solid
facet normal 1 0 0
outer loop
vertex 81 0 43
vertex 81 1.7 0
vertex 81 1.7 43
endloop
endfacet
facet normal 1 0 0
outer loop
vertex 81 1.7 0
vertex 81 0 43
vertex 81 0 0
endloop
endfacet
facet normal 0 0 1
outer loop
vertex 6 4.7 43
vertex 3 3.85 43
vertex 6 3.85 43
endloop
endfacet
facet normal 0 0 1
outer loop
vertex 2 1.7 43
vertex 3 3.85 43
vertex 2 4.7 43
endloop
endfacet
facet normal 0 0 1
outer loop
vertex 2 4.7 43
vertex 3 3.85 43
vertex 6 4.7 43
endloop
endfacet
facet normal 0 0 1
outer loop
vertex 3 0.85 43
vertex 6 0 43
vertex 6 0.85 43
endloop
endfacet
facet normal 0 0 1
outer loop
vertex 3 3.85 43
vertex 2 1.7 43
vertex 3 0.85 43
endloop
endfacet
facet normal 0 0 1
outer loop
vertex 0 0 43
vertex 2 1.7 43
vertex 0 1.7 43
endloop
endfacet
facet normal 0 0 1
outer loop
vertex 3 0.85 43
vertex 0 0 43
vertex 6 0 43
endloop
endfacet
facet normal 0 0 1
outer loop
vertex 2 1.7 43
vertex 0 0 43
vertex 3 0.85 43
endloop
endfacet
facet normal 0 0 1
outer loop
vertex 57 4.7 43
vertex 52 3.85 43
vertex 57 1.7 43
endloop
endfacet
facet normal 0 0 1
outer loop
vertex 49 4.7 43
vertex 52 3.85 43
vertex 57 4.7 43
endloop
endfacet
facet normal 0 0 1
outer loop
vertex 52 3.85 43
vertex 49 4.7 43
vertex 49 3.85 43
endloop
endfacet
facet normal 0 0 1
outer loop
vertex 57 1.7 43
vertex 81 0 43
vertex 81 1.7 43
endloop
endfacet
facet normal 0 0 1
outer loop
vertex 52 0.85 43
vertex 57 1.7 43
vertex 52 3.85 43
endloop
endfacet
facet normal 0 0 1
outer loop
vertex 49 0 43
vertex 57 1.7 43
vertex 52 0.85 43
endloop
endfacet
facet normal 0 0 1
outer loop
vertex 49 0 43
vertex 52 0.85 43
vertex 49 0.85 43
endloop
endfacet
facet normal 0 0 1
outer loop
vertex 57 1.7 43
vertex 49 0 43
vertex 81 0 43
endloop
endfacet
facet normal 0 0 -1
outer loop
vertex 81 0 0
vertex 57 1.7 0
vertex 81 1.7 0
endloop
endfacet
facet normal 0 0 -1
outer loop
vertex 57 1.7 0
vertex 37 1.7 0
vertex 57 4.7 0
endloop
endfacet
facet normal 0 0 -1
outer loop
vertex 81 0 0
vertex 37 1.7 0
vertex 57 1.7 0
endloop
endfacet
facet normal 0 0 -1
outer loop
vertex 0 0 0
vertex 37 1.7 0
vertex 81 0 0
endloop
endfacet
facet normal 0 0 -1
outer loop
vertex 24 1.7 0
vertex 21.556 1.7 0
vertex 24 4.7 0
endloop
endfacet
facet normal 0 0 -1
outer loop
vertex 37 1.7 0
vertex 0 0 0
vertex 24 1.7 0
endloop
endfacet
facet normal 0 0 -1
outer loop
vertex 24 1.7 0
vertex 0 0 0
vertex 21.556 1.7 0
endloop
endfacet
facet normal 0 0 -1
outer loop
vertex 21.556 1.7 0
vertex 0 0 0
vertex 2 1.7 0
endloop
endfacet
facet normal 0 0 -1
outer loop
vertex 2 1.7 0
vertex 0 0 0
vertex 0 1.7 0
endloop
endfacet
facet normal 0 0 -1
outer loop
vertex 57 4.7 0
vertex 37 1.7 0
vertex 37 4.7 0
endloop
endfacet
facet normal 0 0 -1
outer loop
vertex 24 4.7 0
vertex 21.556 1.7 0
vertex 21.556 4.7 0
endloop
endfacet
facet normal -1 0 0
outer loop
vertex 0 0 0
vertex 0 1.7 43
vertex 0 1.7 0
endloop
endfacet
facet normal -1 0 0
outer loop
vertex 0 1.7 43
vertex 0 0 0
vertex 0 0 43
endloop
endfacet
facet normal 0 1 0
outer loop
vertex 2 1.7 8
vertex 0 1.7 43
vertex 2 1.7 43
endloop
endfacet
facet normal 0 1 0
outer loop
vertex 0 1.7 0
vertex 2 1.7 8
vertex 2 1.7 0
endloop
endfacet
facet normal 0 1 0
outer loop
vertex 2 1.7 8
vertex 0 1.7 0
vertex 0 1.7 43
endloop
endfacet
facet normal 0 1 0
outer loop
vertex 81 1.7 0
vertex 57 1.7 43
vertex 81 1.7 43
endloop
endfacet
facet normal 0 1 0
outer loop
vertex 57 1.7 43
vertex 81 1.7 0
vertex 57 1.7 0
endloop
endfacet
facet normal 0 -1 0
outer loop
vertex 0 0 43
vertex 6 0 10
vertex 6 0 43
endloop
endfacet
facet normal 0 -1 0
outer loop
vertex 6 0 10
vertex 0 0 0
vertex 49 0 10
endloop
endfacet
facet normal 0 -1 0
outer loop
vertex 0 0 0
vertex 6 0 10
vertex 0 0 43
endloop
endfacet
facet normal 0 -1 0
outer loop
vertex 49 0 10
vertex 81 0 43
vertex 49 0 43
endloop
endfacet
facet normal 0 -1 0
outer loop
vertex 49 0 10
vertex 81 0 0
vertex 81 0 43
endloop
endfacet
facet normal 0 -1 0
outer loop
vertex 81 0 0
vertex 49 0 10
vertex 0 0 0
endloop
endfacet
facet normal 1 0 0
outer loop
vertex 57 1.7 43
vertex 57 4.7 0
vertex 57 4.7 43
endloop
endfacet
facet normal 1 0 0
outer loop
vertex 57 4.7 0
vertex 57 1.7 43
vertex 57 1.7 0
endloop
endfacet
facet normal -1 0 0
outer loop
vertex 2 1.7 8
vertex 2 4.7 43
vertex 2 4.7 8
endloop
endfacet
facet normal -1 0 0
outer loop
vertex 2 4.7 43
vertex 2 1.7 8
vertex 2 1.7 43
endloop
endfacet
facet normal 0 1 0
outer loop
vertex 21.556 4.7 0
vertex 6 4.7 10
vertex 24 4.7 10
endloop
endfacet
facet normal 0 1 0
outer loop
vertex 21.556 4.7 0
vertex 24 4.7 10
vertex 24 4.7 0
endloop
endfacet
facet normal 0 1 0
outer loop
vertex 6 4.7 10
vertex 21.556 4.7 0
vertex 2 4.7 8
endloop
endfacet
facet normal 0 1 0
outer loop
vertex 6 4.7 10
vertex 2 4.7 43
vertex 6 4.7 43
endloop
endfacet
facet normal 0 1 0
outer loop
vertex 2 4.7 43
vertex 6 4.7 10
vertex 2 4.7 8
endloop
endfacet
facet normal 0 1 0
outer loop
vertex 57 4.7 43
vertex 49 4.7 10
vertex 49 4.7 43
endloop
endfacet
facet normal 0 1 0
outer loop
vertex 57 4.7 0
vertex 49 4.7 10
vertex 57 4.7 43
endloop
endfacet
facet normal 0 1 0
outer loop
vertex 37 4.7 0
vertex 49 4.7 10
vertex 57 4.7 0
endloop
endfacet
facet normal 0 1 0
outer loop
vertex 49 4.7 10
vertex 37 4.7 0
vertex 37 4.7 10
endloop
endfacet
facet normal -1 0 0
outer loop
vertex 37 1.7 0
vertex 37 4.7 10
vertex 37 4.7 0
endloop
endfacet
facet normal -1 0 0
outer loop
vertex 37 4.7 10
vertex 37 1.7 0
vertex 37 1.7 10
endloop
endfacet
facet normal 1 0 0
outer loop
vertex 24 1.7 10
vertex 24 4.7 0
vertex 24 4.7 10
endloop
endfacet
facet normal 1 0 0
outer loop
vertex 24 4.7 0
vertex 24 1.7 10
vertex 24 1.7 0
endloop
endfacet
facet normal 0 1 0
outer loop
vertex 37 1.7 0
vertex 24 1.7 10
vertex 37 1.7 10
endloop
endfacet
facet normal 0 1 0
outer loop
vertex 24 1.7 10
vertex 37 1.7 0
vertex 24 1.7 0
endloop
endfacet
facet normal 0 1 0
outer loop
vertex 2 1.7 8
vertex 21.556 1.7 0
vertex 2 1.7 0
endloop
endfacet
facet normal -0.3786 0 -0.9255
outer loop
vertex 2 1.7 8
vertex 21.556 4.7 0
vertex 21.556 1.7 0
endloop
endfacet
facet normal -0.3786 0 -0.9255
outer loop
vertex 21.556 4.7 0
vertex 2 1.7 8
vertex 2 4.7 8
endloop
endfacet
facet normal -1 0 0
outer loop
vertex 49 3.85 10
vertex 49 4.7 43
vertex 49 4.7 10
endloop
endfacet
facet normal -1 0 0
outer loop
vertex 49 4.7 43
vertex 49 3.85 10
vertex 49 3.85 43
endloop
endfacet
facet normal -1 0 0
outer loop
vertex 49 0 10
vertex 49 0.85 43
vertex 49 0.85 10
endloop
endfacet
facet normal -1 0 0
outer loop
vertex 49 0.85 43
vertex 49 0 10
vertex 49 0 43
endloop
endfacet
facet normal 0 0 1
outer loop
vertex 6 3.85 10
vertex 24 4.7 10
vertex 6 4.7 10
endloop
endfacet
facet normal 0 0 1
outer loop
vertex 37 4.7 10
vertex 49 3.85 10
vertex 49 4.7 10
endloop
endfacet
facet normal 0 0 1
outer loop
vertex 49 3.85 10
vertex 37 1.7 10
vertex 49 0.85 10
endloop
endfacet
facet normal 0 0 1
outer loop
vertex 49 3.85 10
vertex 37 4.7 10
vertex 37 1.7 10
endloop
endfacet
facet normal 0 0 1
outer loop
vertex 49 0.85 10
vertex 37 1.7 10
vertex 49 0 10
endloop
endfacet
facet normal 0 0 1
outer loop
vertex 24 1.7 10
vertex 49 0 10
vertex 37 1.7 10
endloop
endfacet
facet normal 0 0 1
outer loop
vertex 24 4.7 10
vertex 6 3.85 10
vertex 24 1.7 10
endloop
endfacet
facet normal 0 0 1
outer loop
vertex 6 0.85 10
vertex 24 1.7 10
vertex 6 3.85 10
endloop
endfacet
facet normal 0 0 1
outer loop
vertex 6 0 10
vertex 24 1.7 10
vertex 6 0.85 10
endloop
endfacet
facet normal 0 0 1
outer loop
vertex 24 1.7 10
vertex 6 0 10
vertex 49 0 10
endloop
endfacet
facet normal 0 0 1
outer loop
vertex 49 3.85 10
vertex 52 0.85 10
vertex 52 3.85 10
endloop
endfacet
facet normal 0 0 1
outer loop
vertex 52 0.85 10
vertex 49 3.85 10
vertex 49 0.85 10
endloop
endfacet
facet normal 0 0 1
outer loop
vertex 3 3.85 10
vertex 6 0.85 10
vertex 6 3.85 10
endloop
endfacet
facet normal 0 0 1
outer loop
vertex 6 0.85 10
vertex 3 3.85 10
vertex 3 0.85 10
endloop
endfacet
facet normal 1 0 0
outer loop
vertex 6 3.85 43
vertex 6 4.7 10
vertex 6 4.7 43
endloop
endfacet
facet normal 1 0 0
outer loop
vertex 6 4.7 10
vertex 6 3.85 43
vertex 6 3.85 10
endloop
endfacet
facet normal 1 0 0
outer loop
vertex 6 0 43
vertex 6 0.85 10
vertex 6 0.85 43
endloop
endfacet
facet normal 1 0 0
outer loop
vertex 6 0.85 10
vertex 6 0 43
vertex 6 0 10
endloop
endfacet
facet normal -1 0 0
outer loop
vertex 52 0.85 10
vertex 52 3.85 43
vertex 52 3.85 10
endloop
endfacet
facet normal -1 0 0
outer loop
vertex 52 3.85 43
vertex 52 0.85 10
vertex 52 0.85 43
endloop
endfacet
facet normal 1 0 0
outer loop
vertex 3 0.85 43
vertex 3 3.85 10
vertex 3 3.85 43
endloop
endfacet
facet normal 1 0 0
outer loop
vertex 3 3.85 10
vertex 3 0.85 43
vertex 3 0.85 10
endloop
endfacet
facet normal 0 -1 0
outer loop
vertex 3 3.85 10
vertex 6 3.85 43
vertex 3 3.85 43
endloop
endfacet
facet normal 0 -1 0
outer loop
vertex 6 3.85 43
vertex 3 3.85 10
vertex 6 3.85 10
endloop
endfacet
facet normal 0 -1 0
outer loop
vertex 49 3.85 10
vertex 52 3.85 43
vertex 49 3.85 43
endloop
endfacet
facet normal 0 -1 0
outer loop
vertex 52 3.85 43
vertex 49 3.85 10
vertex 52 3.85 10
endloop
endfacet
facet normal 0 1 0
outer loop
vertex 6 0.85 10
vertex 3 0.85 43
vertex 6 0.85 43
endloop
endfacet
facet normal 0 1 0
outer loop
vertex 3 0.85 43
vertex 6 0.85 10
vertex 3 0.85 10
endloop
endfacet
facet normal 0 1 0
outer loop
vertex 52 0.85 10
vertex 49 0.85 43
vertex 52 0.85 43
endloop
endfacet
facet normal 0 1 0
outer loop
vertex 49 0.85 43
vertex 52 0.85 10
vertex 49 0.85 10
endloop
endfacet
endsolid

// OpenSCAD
// slot height = 3 5/16" = 84mm
cardHeight = 81;
// slot depth = 1 11/16" = 43mm
cardDepth = 43;
// slot width = 2mm
cardWidth = 1.7;
// pcb top = 6mm from slot top
pcbFromTop = 6;
// pcb height = 1 13/16" = 46mm
pcbHeight = 43;
// pcb depth = 1 5/16" = 33mm
pcbDepth = 33;
// pcb width = 2mm
pcbWidth = 3;

postFromTop = 24;
postGapSize = 13;

deepMaterialStart = pcbFromTop - 4;

difference() {
  union() {
    // most of the card
    cube(size = [cardHeight, cardWidth, cardDepth], center = false);
    // make deep only where the PCB goes
    translate([deepMaterialStart, cardWidth, 0]) {
      cube(size = [pcbHeight + pcbWidth * 4, pcbWidth, cardDepth], center = false);
    }
  }

  // make space for the posts
  translate([postFromTop, cardWidth, 0]) {
    cube(size = [postGapSize, pcbWidth, cardDepth]);
  }

  // remove some deep material to fit bottom slot
  translate([0, cardWidth * 2 + pcbWidth, 0]) {
    rotate([90, 0, 0]) {
      linear_extrude(height = cardWidth + pcbWidth, center = false) {
        polygon(points = [
          [deepMaterialStart, -1],
          [deepMaterialStart, cardDepth - pcbDepth - 2],
          [24, -1]],
          paths=[[0,1,2]]);
      }
    }
  }  

  // remove card body where pcb goes
  translate([pcbFromTop, 0, cardDepth - pcbDepth]) {
    cube(size = [pcbHeight, cardWidth + pcbWidth, pcbDepth], center = false);
  }

  // remove a little more to make a pcb slot
  translate([pcbFromTop - pcbWidth, cardWidth / 2, cardDepth - pcbDepth]) {
    cube(size = [pcbHeight + pcbWidth * 2, pcbWidth, pcbDepth], center = false);
  } 
}
